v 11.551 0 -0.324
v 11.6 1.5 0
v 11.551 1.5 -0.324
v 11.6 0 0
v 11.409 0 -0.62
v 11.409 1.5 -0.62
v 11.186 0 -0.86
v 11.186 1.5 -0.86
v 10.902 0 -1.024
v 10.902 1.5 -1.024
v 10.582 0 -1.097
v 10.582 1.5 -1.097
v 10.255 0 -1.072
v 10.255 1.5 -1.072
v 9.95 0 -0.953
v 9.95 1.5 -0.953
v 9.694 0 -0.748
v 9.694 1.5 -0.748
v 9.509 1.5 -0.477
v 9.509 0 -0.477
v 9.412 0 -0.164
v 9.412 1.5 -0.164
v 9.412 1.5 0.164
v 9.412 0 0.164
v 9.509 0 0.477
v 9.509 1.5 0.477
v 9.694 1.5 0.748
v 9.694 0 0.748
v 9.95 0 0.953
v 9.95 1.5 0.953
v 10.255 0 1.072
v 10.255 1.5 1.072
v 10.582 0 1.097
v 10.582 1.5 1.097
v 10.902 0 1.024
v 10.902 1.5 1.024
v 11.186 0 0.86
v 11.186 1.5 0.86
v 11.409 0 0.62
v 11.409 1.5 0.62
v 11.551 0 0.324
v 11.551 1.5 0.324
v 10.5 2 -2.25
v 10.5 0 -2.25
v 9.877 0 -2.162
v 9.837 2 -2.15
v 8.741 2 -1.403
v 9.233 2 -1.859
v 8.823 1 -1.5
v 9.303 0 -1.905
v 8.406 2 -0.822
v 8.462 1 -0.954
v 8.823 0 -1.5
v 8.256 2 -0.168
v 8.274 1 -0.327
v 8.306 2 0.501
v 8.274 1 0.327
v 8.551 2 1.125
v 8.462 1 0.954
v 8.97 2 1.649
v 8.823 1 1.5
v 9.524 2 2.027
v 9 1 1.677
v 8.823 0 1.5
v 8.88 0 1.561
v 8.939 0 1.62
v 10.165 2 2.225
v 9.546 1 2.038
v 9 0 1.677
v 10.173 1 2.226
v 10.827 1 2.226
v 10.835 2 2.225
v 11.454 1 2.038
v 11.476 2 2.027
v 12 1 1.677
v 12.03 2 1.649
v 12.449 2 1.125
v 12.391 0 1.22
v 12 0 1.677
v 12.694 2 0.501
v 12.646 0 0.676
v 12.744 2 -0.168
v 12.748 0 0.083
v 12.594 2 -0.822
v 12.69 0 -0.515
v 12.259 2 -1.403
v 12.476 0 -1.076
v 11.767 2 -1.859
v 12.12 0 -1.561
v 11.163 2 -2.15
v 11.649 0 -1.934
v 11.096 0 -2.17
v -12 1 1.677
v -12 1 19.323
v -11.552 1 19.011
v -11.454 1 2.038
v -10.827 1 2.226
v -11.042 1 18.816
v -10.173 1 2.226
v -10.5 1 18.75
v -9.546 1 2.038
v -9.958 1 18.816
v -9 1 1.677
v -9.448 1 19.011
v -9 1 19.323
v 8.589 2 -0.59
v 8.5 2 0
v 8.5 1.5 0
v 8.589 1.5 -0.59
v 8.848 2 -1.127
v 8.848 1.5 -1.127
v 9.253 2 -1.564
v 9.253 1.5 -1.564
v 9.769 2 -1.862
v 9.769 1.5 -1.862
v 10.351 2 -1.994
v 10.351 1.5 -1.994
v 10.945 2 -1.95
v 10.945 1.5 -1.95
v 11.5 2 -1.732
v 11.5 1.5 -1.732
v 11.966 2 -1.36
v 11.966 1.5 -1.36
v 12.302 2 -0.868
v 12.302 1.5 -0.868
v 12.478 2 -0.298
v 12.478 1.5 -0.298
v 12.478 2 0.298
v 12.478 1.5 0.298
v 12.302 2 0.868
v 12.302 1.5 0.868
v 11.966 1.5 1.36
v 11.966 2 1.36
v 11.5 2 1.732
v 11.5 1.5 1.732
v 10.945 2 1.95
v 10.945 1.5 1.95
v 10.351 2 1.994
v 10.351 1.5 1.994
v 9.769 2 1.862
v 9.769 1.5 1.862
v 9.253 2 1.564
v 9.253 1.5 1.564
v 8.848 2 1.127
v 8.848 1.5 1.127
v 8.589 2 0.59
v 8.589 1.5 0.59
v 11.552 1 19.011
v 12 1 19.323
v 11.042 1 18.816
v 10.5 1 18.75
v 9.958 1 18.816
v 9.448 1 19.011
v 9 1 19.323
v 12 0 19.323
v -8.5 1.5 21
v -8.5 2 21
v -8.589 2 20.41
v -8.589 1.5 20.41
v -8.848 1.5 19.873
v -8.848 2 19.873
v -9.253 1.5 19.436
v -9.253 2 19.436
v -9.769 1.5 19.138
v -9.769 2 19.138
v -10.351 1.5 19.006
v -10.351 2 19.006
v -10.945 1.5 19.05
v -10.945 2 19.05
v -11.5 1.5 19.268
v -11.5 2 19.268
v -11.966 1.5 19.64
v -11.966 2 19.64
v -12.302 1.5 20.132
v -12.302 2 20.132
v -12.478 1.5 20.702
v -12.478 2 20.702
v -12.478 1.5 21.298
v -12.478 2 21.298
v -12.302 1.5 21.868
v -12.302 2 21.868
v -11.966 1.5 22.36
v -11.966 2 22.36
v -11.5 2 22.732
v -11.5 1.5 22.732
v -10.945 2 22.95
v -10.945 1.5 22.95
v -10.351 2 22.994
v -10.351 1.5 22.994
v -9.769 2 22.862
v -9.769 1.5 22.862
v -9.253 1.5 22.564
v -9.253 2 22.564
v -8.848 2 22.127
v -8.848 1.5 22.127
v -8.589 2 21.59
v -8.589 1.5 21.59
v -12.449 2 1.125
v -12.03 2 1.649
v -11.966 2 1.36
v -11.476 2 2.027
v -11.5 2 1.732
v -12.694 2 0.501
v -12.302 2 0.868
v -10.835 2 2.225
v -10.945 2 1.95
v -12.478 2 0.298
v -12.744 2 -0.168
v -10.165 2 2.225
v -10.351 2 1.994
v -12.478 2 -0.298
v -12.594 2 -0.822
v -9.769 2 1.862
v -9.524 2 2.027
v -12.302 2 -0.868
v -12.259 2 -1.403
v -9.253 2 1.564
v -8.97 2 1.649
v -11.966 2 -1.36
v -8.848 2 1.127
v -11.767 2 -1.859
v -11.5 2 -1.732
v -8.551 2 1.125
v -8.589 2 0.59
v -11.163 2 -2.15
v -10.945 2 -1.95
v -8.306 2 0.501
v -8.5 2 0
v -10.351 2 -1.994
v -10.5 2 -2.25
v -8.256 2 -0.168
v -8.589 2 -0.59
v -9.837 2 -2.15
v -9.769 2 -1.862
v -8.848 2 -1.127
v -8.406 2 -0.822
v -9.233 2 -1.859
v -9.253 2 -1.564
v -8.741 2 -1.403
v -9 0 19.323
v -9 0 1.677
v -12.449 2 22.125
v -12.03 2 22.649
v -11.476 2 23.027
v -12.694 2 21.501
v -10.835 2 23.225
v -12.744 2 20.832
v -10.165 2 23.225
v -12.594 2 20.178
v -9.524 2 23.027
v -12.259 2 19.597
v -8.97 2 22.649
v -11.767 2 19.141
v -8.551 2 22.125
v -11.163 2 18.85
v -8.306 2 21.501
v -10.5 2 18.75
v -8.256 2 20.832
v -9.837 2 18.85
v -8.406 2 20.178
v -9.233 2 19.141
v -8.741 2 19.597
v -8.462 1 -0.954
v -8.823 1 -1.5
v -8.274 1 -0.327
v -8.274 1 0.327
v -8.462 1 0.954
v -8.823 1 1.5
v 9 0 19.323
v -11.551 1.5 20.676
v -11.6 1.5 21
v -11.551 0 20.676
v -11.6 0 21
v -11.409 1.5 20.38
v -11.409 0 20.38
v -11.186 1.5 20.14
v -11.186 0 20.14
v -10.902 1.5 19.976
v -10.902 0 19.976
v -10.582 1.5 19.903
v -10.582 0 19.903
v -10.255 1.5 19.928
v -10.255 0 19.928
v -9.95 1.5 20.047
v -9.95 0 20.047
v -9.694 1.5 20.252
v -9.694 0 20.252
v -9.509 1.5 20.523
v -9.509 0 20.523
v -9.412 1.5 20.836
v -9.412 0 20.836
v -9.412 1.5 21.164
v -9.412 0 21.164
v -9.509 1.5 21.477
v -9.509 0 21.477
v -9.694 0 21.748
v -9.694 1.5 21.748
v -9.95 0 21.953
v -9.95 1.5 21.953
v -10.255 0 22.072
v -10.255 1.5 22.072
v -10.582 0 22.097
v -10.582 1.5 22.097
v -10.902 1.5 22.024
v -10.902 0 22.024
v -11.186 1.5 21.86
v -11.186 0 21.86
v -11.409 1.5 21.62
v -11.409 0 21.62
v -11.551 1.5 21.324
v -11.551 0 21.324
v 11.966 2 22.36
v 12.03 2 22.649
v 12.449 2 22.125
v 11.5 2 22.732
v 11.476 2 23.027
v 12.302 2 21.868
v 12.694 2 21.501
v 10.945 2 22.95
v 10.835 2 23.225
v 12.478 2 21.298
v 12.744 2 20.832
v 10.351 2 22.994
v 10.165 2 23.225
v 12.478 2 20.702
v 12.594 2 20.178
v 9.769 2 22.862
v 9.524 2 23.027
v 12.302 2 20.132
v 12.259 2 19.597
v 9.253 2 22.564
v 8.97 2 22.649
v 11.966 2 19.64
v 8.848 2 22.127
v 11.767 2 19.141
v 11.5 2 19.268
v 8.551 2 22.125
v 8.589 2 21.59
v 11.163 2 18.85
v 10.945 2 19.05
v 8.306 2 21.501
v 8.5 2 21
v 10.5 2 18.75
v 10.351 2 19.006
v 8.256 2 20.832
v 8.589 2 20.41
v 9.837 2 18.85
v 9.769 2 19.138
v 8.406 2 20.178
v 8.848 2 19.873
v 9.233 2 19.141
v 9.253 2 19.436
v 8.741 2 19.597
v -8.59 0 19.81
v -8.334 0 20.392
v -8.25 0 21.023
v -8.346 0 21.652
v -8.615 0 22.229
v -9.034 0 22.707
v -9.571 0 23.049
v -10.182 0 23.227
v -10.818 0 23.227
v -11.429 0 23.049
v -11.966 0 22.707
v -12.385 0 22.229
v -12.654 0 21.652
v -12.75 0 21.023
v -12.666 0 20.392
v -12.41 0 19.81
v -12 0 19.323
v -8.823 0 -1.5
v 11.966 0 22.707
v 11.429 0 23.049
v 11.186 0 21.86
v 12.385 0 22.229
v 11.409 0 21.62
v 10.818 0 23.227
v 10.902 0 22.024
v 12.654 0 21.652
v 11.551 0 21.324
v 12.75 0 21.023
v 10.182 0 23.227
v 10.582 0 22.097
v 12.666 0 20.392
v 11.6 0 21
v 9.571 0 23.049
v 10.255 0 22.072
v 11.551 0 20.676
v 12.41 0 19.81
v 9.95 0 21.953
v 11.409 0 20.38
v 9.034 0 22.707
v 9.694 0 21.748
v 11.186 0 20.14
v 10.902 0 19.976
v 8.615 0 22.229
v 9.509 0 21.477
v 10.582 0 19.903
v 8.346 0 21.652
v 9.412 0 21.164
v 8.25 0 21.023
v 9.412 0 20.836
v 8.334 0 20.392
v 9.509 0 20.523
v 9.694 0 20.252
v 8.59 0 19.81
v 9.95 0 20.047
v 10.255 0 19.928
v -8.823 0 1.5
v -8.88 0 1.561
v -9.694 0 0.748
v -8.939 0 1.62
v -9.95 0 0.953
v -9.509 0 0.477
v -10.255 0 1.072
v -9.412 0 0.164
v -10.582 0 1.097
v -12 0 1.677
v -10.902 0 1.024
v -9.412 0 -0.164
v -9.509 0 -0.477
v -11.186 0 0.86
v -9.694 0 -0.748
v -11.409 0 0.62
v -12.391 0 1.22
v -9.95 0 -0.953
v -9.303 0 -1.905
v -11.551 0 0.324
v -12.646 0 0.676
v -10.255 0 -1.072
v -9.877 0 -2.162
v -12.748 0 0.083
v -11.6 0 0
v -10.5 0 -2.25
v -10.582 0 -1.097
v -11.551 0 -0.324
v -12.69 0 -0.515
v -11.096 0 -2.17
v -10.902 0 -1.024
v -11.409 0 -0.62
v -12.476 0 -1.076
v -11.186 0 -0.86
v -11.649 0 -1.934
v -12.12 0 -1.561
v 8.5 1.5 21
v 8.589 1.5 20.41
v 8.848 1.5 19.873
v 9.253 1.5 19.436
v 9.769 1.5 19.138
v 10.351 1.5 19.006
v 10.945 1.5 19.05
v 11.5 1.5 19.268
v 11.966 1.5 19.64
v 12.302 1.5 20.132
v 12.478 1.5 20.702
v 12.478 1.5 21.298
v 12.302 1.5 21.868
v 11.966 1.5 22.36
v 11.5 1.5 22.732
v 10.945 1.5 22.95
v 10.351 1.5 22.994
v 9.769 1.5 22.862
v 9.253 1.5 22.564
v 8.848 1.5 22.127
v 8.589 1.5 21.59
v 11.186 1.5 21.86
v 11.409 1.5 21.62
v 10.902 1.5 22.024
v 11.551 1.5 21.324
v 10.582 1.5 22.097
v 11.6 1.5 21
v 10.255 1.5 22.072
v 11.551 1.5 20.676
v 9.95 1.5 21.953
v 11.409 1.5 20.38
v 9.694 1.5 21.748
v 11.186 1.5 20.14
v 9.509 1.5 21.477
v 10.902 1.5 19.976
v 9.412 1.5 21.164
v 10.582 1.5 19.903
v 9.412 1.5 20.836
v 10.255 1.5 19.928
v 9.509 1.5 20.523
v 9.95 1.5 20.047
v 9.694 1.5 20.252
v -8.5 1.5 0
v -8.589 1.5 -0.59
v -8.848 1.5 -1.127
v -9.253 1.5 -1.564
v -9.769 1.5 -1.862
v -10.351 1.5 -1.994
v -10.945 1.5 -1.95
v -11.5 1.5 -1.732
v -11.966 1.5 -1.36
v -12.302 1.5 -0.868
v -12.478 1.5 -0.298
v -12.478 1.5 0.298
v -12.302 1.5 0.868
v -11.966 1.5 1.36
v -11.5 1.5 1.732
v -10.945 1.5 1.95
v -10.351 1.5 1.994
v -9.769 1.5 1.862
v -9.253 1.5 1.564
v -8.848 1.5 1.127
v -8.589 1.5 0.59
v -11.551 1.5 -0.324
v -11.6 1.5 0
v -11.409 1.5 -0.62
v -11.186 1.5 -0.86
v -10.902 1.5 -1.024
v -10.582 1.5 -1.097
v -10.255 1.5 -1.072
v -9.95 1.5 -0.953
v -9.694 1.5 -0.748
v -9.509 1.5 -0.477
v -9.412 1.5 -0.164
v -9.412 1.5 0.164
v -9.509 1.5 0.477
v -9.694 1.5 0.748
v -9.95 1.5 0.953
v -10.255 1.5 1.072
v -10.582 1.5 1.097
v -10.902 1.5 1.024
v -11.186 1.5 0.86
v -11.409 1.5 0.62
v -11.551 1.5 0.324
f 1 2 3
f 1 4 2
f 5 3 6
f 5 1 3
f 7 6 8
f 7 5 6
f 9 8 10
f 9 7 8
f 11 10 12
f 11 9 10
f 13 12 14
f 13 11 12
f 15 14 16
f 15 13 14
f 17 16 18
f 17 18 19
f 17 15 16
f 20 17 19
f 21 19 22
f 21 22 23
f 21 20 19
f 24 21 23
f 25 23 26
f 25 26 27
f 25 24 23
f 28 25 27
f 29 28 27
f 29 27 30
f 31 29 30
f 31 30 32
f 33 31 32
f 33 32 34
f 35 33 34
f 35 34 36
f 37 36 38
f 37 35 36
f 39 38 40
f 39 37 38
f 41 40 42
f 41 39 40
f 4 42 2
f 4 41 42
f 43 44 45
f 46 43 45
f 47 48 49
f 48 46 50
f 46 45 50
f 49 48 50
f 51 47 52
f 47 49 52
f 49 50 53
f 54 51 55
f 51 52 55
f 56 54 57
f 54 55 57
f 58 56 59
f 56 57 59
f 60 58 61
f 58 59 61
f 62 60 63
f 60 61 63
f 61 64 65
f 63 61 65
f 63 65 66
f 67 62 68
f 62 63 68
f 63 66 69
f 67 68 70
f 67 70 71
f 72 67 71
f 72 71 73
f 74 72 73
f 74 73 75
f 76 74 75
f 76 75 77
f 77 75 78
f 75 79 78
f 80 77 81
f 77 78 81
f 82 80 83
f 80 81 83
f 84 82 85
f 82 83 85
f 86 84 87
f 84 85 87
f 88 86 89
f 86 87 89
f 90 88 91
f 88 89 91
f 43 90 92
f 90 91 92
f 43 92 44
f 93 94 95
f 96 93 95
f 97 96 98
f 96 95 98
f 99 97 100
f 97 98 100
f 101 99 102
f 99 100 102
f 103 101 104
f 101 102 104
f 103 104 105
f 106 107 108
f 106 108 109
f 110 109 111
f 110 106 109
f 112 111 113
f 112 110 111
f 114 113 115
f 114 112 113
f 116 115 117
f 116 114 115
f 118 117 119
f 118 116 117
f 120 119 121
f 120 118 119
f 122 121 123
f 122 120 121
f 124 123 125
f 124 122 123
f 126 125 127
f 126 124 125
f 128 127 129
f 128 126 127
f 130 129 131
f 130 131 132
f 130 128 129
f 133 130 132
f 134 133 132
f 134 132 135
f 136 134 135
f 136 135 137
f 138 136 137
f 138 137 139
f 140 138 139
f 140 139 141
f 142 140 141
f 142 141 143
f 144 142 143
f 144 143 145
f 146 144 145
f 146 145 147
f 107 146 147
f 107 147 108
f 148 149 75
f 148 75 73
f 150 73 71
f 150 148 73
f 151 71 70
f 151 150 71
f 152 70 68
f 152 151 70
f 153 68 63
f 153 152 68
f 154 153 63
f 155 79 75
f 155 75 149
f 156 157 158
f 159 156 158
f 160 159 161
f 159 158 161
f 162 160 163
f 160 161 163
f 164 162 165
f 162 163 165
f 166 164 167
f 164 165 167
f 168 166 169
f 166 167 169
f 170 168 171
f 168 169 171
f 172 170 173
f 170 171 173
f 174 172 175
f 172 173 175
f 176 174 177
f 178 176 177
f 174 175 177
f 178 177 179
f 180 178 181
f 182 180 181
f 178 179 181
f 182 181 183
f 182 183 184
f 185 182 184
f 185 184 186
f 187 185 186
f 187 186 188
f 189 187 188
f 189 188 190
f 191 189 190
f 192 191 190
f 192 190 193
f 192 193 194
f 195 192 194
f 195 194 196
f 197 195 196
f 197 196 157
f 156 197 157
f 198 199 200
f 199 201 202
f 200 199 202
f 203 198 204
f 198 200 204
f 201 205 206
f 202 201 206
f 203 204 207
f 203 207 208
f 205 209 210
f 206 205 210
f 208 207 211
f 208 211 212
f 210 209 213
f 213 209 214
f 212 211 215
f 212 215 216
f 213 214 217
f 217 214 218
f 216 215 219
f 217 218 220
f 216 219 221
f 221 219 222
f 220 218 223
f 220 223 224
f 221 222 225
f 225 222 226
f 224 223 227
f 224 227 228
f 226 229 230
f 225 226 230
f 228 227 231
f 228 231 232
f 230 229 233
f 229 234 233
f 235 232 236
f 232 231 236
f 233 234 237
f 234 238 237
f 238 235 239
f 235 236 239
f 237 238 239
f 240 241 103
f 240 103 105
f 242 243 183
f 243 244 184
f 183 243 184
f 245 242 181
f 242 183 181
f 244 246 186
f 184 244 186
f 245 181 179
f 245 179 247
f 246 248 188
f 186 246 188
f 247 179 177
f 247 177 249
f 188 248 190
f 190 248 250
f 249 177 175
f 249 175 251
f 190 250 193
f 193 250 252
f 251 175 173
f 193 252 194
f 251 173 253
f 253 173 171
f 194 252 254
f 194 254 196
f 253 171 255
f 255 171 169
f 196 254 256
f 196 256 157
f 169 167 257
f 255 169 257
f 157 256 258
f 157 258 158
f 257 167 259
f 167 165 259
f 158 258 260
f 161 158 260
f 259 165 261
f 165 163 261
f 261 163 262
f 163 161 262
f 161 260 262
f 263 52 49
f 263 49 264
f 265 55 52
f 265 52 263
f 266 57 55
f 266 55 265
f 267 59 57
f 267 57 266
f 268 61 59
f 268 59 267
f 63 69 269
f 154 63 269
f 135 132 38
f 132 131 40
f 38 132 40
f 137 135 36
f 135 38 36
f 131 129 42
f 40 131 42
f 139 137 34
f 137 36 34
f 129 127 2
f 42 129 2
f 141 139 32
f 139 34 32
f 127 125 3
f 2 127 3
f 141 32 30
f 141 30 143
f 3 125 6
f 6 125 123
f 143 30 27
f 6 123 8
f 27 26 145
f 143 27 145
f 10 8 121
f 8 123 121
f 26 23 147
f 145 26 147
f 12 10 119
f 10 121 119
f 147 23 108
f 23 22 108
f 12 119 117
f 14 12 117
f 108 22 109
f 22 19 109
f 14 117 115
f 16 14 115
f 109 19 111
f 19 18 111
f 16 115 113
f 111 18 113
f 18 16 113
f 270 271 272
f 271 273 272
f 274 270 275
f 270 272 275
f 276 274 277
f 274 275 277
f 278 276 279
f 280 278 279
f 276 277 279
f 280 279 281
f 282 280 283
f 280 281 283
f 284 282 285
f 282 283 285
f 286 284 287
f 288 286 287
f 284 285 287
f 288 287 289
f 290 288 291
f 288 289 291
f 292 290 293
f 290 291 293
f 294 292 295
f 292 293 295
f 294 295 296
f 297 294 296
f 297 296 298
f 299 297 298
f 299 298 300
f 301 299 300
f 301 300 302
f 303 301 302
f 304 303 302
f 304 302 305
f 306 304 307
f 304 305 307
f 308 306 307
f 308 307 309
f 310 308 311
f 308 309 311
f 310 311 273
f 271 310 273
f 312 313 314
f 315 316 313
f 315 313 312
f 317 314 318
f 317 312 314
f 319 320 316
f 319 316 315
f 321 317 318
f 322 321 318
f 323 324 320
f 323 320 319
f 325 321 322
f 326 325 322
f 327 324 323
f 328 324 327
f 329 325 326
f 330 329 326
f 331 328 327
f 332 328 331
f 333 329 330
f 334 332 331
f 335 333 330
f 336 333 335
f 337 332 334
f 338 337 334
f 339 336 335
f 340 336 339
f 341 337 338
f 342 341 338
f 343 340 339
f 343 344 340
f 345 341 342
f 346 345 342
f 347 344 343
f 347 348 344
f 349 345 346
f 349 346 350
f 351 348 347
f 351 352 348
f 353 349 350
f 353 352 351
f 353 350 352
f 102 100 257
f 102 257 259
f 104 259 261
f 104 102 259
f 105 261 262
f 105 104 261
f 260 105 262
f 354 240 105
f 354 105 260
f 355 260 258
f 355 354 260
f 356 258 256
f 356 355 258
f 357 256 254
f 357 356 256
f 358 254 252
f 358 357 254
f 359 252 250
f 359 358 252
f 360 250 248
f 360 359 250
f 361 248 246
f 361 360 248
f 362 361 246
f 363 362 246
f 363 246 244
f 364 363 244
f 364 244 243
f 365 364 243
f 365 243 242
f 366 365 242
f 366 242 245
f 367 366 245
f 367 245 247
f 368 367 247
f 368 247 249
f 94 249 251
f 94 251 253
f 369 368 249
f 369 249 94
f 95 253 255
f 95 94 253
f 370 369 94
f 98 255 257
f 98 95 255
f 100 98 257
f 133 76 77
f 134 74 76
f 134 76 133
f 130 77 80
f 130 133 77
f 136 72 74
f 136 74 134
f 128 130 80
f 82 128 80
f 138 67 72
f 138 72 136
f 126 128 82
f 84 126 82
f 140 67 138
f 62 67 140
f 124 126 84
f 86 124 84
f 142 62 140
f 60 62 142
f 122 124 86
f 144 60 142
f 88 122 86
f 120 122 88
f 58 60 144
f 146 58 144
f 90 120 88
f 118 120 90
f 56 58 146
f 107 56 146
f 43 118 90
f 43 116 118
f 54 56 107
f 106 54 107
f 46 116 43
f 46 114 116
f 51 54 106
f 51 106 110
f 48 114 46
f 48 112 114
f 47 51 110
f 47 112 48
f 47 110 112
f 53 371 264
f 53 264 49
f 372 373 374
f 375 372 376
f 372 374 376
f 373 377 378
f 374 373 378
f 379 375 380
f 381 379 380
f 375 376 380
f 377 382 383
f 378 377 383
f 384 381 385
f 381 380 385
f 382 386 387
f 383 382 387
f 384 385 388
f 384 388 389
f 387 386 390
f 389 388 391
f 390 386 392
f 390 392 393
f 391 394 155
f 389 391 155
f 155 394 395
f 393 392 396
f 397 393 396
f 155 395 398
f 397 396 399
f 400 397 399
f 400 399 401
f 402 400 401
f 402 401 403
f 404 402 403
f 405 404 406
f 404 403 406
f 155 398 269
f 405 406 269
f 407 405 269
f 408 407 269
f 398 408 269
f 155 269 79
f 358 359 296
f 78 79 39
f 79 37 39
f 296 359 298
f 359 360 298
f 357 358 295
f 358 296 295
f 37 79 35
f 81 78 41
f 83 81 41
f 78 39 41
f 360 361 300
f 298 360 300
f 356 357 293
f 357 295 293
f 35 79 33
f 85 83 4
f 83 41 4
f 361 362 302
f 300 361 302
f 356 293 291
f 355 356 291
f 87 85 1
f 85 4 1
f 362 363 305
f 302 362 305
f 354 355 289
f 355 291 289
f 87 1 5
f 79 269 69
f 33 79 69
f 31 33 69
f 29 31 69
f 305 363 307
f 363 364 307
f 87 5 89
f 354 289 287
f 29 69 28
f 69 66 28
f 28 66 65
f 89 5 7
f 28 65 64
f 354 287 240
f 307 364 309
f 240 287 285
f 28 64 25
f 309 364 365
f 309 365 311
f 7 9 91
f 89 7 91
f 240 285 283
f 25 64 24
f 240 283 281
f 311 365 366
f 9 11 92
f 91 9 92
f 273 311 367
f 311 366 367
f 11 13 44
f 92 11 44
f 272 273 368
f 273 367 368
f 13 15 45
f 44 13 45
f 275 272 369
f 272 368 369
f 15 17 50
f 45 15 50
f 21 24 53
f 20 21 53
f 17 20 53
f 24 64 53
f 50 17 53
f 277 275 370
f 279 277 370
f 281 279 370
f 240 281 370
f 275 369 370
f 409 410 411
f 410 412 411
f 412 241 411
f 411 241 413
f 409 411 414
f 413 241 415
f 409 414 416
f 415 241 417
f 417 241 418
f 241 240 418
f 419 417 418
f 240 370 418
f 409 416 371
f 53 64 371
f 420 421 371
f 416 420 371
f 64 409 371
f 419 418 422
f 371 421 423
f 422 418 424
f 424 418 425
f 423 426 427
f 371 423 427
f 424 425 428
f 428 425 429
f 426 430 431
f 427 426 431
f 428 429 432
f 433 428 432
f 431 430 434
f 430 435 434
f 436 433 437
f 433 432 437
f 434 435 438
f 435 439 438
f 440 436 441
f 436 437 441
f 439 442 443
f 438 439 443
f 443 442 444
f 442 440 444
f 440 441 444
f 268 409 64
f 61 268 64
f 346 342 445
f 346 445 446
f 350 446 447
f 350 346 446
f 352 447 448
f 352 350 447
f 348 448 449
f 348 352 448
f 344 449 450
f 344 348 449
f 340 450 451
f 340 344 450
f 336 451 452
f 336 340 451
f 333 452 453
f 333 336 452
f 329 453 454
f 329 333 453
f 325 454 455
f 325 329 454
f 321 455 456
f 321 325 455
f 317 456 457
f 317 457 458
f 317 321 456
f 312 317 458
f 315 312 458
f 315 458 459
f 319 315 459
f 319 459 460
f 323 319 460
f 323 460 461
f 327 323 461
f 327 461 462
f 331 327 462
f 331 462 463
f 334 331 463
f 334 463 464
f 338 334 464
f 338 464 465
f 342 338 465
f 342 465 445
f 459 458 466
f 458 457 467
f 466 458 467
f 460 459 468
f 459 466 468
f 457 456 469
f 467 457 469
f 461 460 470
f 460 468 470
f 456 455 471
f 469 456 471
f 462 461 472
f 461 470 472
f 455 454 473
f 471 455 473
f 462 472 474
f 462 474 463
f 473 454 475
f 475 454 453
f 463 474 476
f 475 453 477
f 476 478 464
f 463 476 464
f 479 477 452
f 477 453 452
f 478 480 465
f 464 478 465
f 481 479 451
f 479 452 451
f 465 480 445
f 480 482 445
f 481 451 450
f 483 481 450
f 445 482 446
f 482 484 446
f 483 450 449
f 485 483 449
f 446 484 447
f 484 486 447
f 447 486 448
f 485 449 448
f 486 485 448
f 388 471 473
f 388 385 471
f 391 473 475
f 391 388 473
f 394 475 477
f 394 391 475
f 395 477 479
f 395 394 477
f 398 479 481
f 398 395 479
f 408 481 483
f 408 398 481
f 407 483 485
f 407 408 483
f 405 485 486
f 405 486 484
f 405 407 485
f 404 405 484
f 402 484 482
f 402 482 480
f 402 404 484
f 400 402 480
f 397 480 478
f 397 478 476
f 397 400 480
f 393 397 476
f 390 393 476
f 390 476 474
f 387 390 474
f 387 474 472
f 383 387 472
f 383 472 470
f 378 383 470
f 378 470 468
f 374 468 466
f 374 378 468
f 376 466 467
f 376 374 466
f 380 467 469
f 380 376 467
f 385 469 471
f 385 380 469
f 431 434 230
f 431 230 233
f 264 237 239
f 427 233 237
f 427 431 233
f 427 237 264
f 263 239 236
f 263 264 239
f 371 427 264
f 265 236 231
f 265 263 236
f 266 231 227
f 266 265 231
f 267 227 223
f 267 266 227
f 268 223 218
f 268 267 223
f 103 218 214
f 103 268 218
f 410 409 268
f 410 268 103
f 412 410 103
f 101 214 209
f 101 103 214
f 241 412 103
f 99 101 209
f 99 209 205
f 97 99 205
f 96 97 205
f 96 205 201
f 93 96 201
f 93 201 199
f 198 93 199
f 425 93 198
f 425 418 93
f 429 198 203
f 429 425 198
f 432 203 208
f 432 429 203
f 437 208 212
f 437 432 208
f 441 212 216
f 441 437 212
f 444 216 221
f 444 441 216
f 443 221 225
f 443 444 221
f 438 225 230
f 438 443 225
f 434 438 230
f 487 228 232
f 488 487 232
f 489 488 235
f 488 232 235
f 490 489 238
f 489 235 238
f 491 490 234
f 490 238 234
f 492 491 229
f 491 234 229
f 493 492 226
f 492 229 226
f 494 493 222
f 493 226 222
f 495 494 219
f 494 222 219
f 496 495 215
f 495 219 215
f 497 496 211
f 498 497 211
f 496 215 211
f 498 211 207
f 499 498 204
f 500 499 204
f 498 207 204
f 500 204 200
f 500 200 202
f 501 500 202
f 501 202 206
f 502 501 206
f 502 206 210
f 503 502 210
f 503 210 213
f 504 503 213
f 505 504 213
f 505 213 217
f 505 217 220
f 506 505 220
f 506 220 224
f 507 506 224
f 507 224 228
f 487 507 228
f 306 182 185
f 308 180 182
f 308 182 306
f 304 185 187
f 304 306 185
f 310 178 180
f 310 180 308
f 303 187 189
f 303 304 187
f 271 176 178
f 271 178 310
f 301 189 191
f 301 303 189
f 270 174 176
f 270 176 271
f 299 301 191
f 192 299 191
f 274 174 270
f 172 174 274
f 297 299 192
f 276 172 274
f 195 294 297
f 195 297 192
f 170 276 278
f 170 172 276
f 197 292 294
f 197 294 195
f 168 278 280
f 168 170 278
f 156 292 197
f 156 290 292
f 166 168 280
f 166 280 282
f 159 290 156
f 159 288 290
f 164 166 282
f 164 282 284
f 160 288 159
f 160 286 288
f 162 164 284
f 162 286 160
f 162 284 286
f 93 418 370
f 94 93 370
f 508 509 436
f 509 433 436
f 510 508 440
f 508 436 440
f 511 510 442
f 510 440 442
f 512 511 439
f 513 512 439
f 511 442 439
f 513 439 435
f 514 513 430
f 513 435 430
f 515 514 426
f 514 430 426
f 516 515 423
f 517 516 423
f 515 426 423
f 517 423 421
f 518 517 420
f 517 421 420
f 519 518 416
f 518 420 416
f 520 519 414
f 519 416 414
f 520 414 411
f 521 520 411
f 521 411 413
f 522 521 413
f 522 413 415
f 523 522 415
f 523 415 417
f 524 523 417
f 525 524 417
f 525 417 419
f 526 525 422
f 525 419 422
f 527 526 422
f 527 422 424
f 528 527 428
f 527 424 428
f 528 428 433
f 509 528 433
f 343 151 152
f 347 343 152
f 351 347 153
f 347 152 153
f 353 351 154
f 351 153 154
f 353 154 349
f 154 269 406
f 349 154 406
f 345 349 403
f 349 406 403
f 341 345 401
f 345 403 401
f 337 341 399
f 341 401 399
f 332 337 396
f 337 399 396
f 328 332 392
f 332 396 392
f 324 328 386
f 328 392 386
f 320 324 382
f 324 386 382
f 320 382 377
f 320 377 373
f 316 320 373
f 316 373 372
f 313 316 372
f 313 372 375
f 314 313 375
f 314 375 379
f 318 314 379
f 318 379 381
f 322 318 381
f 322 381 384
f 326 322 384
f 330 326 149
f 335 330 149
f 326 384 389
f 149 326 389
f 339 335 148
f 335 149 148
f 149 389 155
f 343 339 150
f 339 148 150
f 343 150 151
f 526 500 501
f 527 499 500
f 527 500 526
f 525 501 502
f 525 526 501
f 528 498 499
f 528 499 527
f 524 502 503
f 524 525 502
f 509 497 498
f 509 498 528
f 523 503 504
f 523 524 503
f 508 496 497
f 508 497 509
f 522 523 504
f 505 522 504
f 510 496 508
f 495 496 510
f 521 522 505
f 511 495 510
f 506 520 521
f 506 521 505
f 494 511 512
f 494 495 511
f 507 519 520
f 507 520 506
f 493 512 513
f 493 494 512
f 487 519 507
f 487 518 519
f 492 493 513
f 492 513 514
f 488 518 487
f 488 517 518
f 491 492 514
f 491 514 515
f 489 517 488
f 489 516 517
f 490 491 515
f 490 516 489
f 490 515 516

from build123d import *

# Parameters (mm, degrees)
SKETCH_1_W                   = 21
SKETCH_1_H                   = 3
EXTRUDE_1_DEPTH              = 1
SKETCH_3_W                   = 3
SKETCH_3_H                   = 21
EXTRUDE_3_DEPTH              = 1
SKETCH_2_R                   = 2.25
EXTRUDE_4_DEPTH              = 2
HOLE_WIZARD_M2_2_D           = 2.2
HOLE_WIZARD_M2_2_CBORE_D     = 4
HOLE_WIZARD_M2_2_CBORE_DEPTH = 0.5


with BuildPart() as part:
    # ｽｹｯﾁ1 → ﾎﾞｽ - 押し出し1 (new body)
    with BuildSketch(Plane(origin=(0, 0, 0), x_dir=(1, 0, 0), z_dir=(0, 1, 0))):
        Rectangle(SKETCH_1_W, SKETCH_1_H)
    extrude(amount=EXTRUDE_1_DEPTH)

    # ｽｹｯﾁ3 → ﾎﾞｽ - 押し出し3 (add)
    with BuildSketch(Plane.XZ):
        with Locations((-10.5, 10.5)):
            Rectangle(SKETCH_3_W, SKETCH_3_H)
    extrude_3 = extrude(amount=-EXTRUDE_3_DEPTH)

    # ｽｹｯﾁ2 → ﾎﾞｽ - 押し出し4 (add)
    with BuildSketch(Plane.XZ):
        with Locations(Location((-10.5, 0, 0), (0, 0, 270))):
            Circle(SKETCH_2_R)
        with Locations(Location((-10.5, 21, 0), (0, 0, 270))):
            Circle(SKETCH_2_R)
    extrude_4 = extrude(amount=-EXTRUDE_4_DEPTH)

    # M2 なべ頭ねじ用座ぐり穴2 (through all)
    with Locations(Plane(origin=(0, 2, 0), x_dir=(1, 0, 0), z_dir=(0, 1, 0))):
        with Locations((-10.5, 0), (-10.5, -21)):
            hole_wizard_m2_2 = CounterBoreHole(HOLE_WIZARD_M2_2_D / 2, HOLE_WIZARD_M2_2_CBORE_D / 2, HOLE_WIZARD_M2_2_CBORE_DEPTH)

    # ﾐﾗｰ2: ﾎﾞｽ - 押し出し3, ﾎﾞｽ - 押し出し4, M2 なべ頭ねじ用座ぐり穴2 across plane
    add(extrude_3.mirror(Plane(origin=(0, 0, 0), x_dir=(0, 0, 1), z_dir=(1, 0, 0))))
    add(extrude_4.mirror(Plane(origin=(0, 0, 0), x_dir=(0, 0, 1), z_dir=(1, 0, 0))))
    add(hole_wizard_m2_2.mirror(Plane(origin=(0, 0, 0), x_dir=(0, 0, 1), z_dir=(1, 0, 0))), mode=Mode.SUBTRACT)


solid = part.part
